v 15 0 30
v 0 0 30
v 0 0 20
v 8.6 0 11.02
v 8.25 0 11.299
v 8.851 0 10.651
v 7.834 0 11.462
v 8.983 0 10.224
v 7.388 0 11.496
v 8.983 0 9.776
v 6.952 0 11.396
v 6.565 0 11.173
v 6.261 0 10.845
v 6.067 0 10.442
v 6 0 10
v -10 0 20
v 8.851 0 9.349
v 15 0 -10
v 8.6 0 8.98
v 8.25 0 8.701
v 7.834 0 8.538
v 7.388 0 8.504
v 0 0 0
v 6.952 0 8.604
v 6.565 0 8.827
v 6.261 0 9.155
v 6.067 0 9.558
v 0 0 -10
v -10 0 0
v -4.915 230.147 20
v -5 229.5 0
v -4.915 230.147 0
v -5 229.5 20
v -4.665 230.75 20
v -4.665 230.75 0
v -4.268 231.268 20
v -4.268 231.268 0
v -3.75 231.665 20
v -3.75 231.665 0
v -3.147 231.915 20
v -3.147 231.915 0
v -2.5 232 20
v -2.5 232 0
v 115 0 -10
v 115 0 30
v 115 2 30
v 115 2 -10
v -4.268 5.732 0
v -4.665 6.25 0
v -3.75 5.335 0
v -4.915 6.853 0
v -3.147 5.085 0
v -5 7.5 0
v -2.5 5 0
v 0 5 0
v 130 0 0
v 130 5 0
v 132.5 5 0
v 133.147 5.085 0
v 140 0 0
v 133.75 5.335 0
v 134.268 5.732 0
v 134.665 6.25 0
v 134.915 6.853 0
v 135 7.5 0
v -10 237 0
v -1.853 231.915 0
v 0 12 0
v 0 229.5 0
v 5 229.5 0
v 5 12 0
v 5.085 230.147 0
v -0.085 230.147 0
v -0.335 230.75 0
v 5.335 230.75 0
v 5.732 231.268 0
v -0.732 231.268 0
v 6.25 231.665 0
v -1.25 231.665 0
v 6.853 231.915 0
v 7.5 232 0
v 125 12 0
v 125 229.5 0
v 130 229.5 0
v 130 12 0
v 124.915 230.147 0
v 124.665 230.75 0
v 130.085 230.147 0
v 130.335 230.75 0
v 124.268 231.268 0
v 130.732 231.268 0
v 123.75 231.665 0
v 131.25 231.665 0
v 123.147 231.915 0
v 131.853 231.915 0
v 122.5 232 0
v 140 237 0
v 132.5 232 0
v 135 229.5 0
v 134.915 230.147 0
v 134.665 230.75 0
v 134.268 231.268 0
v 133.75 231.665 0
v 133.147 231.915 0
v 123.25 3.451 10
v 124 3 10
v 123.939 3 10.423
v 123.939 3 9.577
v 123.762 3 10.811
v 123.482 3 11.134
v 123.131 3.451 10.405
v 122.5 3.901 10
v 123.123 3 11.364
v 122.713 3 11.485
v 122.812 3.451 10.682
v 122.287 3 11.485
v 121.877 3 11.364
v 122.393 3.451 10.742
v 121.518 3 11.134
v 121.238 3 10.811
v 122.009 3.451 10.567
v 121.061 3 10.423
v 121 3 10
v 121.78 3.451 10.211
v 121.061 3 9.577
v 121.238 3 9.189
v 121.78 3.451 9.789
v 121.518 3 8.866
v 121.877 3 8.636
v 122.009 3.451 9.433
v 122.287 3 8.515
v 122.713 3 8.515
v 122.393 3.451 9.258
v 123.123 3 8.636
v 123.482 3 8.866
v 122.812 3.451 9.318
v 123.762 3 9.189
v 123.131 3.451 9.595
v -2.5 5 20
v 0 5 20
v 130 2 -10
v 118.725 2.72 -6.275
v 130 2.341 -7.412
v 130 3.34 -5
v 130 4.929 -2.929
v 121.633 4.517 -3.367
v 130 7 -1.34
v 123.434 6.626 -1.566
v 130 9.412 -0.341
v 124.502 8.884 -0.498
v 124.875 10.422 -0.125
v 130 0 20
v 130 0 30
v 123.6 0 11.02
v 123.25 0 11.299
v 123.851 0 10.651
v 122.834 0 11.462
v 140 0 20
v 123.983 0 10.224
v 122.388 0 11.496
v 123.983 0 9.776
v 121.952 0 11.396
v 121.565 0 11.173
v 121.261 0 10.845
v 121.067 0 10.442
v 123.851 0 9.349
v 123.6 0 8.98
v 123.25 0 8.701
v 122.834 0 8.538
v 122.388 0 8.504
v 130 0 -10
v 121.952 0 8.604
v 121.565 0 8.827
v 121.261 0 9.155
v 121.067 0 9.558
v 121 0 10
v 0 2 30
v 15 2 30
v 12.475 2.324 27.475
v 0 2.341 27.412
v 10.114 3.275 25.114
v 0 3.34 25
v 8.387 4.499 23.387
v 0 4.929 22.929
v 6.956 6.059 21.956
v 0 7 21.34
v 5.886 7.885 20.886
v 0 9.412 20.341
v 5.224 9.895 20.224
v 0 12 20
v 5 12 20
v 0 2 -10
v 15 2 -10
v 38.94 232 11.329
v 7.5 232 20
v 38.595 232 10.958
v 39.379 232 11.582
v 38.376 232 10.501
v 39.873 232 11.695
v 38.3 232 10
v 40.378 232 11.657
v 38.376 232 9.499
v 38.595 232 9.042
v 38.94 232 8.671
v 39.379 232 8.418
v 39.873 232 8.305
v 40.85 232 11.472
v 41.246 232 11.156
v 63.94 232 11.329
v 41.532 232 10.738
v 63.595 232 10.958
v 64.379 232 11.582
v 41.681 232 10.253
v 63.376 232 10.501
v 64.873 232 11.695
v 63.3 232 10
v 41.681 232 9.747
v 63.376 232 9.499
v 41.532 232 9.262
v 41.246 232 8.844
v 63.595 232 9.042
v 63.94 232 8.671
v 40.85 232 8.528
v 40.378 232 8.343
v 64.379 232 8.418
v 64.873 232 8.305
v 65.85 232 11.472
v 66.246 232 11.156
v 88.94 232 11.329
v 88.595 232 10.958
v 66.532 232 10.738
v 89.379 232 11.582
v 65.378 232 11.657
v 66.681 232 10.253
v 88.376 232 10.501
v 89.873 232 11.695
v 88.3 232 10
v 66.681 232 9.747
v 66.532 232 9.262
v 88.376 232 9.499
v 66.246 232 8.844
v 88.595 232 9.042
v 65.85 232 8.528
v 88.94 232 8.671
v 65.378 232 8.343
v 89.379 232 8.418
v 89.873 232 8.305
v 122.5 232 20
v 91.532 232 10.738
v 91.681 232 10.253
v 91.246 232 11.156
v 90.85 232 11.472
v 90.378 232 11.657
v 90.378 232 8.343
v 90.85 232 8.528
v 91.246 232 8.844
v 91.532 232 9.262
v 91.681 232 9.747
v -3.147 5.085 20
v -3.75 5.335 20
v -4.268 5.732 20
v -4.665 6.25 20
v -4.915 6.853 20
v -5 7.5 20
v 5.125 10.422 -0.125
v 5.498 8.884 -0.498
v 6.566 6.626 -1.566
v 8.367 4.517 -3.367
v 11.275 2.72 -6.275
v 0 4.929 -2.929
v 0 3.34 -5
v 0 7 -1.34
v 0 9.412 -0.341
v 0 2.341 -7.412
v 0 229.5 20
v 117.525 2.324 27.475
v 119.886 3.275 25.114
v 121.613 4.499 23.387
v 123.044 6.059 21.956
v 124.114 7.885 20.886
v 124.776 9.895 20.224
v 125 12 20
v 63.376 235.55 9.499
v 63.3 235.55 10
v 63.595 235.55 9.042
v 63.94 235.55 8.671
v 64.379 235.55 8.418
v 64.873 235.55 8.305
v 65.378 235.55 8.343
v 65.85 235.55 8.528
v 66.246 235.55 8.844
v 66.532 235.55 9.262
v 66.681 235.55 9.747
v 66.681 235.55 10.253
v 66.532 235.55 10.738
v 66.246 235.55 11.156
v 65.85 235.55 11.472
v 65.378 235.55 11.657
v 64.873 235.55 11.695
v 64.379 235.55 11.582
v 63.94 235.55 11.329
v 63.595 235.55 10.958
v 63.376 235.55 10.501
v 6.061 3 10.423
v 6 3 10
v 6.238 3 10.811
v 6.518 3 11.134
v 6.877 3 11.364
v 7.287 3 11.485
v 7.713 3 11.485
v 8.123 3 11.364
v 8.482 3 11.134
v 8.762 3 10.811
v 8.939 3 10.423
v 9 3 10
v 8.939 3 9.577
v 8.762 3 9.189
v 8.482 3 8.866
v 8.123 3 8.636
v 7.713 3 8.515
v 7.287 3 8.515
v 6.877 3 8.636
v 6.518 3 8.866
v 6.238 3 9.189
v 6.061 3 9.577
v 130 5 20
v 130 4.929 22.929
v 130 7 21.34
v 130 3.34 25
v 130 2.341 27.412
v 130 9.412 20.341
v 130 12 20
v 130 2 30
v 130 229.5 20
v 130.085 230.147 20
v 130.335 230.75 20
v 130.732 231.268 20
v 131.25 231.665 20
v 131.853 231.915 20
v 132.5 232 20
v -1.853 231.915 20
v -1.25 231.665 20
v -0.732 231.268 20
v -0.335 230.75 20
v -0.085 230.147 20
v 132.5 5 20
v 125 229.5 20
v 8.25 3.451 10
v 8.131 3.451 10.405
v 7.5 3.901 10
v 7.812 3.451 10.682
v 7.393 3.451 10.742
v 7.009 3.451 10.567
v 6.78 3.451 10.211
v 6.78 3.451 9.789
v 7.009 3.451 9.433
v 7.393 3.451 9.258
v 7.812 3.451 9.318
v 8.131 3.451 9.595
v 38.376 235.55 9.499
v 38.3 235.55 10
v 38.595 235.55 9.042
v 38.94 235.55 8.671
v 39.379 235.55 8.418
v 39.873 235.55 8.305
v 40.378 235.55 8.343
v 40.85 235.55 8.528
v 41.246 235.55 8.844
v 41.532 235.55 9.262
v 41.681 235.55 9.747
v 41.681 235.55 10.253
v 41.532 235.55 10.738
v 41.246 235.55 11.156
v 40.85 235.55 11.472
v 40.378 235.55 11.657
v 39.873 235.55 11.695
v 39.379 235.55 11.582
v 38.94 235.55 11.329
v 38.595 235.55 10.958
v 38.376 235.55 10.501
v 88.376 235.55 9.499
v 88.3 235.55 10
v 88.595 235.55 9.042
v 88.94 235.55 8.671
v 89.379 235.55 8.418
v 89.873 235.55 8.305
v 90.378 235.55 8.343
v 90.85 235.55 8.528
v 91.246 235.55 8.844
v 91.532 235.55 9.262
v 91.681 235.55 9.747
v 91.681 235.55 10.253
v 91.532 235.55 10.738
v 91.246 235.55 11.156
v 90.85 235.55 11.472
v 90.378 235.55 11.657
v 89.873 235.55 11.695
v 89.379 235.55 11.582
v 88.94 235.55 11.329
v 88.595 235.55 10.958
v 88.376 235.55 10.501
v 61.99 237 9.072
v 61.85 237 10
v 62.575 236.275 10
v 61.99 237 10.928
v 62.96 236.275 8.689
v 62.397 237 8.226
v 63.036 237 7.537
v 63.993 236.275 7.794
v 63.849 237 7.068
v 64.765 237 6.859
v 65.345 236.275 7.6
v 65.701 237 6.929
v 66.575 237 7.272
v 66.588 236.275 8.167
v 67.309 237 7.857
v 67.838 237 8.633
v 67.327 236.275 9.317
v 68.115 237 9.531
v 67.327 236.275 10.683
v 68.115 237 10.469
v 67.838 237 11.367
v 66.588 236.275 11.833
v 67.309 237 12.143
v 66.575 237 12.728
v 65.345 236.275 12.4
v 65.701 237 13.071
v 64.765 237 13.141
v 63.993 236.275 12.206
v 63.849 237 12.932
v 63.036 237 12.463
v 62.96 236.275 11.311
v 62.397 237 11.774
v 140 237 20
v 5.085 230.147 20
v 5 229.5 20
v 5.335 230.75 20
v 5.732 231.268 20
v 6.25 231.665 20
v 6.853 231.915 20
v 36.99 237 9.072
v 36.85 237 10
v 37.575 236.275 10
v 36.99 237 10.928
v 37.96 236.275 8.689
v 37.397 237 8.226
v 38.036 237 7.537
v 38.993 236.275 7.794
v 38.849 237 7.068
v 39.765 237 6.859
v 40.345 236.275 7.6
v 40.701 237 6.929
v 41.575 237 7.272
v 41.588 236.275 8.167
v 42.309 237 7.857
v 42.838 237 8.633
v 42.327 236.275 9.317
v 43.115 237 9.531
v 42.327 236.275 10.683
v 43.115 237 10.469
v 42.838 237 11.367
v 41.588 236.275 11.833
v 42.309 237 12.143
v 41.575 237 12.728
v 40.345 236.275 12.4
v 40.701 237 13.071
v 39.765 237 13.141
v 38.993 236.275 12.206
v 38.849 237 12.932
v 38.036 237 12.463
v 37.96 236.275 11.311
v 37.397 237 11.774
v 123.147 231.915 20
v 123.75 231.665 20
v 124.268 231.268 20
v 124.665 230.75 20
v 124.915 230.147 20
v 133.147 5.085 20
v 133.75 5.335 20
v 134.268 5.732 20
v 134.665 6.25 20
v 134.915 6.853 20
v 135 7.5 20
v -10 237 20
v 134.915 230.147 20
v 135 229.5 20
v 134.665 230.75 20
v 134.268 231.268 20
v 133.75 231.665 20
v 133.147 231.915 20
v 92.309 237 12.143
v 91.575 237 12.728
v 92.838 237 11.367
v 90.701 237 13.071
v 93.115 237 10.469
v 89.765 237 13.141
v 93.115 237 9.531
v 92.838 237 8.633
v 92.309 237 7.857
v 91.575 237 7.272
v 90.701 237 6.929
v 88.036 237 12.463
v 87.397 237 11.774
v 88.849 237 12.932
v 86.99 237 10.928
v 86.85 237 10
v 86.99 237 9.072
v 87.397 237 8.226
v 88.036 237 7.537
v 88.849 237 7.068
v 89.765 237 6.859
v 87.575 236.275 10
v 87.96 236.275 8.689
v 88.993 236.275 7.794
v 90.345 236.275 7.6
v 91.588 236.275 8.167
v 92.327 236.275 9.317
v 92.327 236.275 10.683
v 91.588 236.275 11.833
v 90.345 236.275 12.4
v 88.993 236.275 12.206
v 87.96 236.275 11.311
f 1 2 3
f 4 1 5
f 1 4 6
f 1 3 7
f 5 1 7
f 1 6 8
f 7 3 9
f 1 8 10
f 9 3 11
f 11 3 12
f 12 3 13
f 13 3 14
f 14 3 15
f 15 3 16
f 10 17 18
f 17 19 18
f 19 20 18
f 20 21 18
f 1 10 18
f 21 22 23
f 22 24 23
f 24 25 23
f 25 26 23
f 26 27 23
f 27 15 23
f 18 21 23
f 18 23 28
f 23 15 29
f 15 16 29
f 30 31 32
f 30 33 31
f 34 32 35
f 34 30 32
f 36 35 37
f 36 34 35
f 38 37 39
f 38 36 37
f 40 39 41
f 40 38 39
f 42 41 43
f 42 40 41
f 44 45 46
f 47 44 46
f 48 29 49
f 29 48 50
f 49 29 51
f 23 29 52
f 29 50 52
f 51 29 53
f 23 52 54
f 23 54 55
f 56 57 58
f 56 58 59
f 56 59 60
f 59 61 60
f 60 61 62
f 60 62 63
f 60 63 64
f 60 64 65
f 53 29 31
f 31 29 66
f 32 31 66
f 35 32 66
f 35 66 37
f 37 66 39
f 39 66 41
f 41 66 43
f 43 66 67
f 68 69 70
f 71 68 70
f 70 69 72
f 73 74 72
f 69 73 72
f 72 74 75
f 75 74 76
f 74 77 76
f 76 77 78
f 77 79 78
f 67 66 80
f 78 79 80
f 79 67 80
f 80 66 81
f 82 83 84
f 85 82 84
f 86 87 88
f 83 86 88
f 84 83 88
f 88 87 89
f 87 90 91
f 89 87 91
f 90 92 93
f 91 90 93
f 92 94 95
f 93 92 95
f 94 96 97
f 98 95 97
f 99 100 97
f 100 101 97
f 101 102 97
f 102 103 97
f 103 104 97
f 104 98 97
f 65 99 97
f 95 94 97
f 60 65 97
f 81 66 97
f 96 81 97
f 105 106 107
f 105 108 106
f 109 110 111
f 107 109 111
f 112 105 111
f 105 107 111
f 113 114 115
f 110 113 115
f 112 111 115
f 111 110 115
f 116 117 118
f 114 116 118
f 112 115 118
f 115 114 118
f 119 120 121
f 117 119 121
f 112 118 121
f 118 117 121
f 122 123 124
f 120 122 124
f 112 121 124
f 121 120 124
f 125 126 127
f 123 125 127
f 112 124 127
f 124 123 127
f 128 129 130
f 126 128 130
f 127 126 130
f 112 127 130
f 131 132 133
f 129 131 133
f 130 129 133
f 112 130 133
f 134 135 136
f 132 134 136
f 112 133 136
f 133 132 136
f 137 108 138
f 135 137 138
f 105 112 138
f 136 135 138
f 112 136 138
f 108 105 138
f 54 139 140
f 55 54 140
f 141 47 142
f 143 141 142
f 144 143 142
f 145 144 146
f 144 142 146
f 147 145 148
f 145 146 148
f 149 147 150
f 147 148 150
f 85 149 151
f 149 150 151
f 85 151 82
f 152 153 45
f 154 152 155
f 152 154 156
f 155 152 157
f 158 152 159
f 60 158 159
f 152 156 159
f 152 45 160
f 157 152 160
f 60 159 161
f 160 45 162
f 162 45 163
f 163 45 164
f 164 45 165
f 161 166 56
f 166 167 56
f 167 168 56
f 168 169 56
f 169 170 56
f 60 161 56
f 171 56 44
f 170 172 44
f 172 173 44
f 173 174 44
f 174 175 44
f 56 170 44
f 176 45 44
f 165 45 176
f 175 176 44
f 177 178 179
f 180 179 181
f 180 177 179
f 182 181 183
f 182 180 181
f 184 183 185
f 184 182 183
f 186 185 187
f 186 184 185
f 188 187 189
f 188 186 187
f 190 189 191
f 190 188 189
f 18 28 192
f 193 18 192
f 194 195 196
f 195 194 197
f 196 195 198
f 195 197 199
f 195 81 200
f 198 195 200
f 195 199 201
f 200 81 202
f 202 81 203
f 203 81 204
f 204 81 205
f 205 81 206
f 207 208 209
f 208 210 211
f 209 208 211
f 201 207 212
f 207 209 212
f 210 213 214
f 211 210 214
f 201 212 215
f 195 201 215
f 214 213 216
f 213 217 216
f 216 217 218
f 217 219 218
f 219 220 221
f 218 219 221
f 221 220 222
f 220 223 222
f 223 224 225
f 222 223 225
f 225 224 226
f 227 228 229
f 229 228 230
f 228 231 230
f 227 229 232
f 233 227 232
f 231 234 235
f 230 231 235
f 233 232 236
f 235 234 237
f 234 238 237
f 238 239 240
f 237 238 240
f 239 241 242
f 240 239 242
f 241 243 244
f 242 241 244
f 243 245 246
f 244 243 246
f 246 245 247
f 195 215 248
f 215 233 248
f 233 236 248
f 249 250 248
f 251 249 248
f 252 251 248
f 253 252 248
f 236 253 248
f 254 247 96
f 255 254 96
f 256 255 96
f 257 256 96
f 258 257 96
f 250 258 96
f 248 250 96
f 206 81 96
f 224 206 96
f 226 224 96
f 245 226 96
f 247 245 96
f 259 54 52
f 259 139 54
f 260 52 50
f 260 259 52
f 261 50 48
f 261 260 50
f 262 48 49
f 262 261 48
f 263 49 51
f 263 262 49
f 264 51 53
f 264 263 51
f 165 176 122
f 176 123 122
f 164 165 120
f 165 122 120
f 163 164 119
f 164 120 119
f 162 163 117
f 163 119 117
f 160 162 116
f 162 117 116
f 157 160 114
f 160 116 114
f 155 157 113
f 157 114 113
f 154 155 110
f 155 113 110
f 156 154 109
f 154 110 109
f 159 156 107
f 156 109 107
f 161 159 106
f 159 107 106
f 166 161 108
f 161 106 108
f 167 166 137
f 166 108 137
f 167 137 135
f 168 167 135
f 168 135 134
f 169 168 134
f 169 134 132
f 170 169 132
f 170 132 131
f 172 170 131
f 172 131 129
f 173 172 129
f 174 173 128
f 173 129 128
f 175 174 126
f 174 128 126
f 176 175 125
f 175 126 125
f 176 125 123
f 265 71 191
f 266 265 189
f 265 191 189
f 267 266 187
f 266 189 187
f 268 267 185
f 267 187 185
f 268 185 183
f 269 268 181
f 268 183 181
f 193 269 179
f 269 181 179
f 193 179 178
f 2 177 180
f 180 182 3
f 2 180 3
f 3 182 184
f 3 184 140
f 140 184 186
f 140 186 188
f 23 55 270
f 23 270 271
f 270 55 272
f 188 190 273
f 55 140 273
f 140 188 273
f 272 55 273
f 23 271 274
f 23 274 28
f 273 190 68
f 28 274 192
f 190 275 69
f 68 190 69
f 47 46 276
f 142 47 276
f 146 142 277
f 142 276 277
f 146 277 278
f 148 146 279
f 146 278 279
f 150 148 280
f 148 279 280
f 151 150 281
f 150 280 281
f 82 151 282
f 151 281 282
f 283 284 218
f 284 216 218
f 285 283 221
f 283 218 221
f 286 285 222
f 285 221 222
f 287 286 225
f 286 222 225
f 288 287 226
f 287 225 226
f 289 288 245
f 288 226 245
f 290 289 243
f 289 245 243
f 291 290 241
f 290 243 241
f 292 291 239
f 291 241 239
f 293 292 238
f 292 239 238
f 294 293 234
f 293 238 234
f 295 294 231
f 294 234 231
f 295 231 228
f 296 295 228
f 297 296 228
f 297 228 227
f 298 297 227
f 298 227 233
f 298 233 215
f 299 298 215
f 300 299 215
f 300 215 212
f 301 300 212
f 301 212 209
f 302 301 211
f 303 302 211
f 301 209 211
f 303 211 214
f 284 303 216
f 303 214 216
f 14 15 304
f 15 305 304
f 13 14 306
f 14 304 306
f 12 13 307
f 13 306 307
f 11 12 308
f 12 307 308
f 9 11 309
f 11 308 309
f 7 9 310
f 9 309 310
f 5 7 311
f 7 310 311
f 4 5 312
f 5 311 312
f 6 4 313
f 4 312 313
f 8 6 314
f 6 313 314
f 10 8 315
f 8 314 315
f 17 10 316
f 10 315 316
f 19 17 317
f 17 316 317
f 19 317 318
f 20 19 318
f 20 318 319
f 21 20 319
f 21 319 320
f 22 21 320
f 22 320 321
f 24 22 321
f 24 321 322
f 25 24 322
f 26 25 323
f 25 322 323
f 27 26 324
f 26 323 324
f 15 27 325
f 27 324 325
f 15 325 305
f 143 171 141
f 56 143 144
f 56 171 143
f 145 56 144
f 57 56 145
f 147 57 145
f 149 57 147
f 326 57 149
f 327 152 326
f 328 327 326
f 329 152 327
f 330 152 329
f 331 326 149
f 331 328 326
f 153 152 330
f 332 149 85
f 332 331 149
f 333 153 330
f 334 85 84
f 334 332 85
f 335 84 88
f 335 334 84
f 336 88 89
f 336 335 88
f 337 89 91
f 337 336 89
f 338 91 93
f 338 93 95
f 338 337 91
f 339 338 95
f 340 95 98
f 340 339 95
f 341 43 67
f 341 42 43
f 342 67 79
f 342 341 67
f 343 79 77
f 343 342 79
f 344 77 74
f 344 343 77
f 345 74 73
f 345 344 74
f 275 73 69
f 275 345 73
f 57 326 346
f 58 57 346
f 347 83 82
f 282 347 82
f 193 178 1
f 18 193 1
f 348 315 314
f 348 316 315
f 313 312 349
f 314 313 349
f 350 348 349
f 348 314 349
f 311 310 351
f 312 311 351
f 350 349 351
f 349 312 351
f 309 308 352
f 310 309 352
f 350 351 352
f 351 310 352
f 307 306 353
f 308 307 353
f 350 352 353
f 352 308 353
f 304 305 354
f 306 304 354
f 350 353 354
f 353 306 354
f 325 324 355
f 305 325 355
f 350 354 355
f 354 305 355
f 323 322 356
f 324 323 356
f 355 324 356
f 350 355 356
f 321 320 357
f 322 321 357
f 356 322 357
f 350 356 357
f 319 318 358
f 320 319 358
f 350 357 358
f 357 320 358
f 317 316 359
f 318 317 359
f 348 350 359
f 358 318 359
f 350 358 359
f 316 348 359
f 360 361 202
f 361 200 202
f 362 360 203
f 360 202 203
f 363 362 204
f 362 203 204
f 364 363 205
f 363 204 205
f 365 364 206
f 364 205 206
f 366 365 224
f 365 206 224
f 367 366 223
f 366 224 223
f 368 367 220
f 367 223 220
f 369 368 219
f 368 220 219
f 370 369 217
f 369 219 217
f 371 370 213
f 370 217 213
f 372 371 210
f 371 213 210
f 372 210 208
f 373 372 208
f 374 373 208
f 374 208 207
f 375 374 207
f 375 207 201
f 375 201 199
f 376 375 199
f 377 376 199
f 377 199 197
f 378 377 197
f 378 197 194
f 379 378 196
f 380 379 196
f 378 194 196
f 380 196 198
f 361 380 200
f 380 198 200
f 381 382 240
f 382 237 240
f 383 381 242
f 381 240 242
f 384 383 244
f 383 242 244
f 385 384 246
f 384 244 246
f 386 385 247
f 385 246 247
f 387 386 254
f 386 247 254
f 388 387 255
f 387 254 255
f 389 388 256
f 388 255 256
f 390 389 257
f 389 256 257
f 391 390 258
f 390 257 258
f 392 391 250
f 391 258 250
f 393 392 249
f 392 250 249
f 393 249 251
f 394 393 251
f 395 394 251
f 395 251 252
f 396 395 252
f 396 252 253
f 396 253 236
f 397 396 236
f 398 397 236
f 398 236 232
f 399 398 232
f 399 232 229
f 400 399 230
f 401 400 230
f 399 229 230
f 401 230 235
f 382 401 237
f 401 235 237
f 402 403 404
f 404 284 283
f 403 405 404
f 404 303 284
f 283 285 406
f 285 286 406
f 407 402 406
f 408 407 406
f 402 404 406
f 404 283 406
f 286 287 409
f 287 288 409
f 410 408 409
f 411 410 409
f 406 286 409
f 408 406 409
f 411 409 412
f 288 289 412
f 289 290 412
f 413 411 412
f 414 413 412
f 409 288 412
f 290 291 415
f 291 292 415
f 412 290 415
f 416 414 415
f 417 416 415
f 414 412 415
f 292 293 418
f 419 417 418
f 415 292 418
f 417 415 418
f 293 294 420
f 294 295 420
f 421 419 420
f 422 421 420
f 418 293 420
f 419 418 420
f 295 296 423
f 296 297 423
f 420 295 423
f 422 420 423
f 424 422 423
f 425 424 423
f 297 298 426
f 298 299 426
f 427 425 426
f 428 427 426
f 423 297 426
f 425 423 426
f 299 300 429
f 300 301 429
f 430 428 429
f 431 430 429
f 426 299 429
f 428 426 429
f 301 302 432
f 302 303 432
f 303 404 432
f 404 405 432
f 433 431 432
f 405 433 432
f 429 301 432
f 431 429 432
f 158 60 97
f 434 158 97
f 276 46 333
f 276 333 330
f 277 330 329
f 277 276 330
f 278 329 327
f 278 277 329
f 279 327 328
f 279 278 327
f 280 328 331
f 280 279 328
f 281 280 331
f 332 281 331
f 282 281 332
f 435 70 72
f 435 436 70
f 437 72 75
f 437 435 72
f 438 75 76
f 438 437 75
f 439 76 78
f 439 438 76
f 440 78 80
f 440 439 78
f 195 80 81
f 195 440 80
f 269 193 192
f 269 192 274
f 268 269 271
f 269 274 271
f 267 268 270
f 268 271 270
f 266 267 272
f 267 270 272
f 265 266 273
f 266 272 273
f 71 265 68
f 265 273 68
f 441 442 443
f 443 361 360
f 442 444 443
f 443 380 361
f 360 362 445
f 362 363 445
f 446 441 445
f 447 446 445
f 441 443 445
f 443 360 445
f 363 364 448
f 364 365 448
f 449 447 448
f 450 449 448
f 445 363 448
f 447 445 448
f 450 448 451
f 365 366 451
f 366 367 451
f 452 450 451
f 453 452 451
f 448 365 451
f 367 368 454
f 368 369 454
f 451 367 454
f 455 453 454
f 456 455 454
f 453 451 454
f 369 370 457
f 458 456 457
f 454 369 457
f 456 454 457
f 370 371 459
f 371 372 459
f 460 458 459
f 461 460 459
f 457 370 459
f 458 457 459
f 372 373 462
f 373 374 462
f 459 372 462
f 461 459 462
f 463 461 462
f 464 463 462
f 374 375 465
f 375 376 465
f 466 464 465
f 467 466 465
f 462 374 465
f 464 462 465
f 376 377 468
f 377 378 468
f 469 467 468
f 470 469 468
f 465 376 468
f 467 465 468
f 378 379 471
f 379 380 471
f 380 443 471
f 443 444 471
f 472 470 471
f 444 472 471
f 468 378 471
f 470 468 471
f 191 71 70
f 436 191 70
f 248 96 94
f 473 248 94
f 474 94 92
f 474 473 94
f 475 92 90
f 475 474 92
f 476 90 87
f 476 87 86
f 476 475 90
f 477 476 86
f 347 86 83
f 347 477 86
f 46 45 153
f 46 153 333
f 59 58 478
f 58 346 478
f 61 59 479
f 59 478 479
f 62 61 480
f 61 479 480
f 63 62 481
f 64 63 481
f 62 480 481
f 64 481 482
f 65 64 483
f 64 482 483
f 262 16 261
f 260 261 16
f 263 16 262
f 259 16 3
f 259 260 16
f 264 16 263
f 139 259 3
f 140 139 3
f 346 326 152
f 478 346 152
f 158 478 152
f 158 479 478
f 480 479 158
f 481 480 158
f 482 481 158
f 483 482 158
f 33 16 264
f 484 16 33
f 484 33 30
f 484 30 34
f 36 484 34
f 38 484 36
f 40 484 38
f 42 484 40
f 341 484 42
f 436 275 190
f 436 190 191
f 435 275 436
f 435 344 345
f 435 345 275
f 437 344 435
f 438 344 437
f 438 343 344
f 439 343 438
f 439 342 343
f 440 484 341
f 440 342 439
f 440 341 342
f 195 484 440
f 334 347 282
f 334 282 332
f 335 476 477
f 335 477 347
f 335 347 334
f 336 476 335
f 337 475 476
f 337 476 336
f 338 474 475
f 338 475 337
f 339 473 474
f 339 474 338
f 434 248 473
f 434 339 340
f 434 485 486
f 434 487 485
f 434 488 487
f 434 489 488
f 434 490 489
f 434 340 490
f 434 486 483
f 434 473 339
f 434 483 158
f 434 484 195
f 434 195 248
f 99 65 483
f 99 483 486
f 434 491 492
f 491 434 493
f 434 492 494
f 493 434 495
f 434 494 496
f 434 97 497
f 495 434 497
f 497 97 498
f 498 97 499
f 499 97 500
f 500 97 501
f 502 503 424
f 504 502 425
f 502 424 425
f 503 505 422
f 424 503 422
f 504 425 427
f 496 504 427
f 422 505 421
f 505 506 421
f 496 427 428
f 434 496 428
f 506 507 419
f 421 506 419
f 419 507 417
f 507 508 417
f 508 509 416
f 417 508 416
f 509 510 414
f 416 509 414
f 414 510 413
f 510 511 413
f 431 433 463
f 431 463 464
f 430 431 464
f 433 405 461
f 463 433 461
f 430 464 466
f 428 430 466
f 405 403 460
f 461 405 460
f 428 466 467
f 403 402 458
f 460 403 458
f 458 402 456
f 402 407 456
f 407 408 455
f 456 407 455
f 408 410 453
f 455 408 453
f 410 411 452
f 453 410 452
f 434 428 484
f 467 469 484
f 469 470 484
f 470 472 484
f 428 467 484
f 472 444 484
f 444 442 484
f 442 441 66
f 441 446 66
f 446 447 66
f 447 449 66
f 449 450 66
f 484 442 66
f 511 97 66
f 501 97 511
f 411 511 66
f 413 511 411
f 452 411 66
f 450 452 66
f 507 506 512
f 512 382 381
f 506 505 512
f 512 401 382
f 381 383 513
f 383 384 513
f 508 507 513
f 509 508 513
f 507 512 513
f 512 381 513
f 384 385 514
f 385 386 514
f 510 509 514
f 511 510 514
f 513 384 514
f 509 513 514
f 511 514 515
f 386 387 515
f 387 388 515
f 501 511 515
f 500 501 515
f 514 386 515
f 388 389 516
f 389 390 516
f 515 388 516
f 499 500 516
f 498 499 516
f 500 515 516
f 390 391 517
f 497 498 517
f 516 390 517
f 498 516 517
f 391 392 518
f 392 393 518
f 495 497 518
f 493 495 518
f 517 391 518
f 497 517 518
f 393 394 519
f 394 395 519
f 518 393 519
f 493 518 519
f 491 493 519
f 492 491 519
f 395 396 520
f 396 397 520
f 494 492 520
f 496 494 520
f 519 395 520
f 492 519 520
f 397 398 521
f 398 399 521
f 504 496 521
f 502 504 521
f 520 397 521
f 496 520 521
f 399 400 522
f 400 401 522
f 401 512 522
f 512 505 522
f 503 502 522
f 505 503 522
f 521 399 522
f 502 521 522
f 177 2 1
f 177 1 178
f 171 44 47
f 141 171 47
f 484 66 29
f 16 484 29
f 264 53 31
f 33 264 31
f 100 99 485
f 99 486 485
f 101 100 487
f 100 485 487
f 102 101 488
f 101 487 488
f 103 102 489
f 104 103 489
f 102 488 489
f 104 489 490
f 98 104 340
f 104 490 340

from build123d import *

# Parameters (mm, degrees)
SKETCH2_W                                       = 5
SKETCH2_H                                       = 227
BOSS_EXTRUDE1_DEPTH                             = 20
BOSS_EXTRUDE2_REACH                             = 277.987
CUT_EXTRUDE1_DEPTH                              = 44
F_3_0MM_DOWEL_HOLE1_D                           = 3
F_3_0MM_DOWEL_HOLE1_DEPTH                       = 3
F_3_0MM_DOWEL_HOLE1_TIP                         = 0.901290929
CSK_FOR_M3_FLAT_HEAD_MACHINE_SCREW1_D           = 3.4
CSK_FOR_M3_FLAT_HEAD_MACHINE_SCREW1_CSINK_D     = 6.3
CSK_FOR_M3_FLAT_HEAD_MACHINE_SCREW1_CSINK_ANGLE = 90
FILLET1_R                                       = 2.5


with BuildPart() as part:
    # Sketch2 → Boss-Extrude1 (new body)
    with BuildSketch(Plane.XY):
        Polygon((15, 12), (5, 12), (5, 232), (125, 232), (125, 12), (115, 12), (115, 0), (140, 0), (140, 237), (-10, 237), (-10, 0), (15, 0), align=None)
        with Locations((132.5, 118.5)):
            Rectangle(SKETCH2_W, SKETCH2_H, mode=Mode.SUBTRACT)
        with Locations((-2.5, 118.5)):
            Rectangle(SKETCH2_W, SKETCH2_H, mode=Mode.SUBTRACT)
    extrude(amount=BOSS_EXTRUDE1_DEPTH)

    # Boss-Extrude2: up to this face of the body (flat: up to its plane)
    boss_extrude2_end = Plane(part.part.faces().sort_by_distance((130, 118.5, 10))[0])
    # Sketch3 → Boss-Extrude2 (add, up to the picked face)
    with BuildSketch(Plane.ZY, mode=Mode.PRIVATE) as boss_extrude2_sk1:
        with BuildLine():
            Line((20, 0), (30, 0))
            Line((30, 0), (30, 2))
            ThreePointArc((30, 2), (22.928932188, 4.928932188), (20, 12))
            Line((20, 12), (20, 0))
        make_face()
    boss_extrude2_tool1 = split(extrude(boss_extrude2_sk1.sketch, amount=-BOSS_EXTRUDE2_REACH, mode=Mode.PRIVATE), bisect_by=boss_extrude2_end, keep=Keep.BOTH, mode=Mode.PRIVATE)
    # Sketch3 → Boss-Extrude2 (add, up to the picked face)
    with BuildSketch(Plane.ZY, mode=Mode.PRIVATE) as boss_extrude2_sk2:
        with BuildLine():
            Line((0, 0), (-10, 0))
            Line((-10, 0), (-10, 2))
            ThreePointArc((-10, 2), (-2.928932188, 4.928932188), (0, 12))
            Line((0, 12), (0, 0))
        make_face()
    boss_extrude2_tool2 = split(extrude(boss_extrude2_sk2.sketch, amount=-BOSS_EXTRUDE2_REACH, mode=Mode.PRIVATE), bisect_by=boss_extrude2_end, keep=Keep.BOTH, mode=Mode.PRIVATE)
    add(boss_extrude2_tool1.solids().sort_by(Axis((0, 2.673783, 23.568126), (1, 0, 0)))[0])
    add(boss_extrude2_tool2.solids().sort_by(Axis((0, 2.673783, -3.568126), (1, 0, 0)))[0])

    # Sketch4 → Cut-Extrude1 (cut)
    with BuildSketch(Plane.XY.offset(30)):
        with BuildLine():
            Line((15, 2), (15, 0))
            Line((15, 0), (115, 0))
            Line((115, 0), (115, 2))
            ThreePointArc((115, 2), (122.071067812, 4.928932188), (125, 12))
            Line((125, 12), (5, 12))
            ThreePointArc((5, 12), (7.928932188, 4.928932188), (15, 2))
        make_face()
    extrude(amount=-CUT_EXTRUDE1_DEPTH, mode=Mode.SUBTRACT)

    # Ø3.0mm Dowel Hole1
    with Locations(Plane.XZ):
        with Locations((7.5, 10), (122.5, 10)):
            Hole(F_3_0MM_DOWEL_HOLE1_D / 2, depth=F_3_0MM_DOWEL_HOLE1_DEPTH)
            with Locations((0, 0, -(F_3_0MM_DOWEL_HOLE1_DEPTH + F_3_0MM_DOWEL_HOLE1_TIP / 2))):  # 118° drill point
                Cone(0, F_3_0MM_DOWEL_HOLE1_D / 2, F_3_0MM_DOWEL_HOLE1_TIP, mode=Mode.SUBTRACT)

    # CSK for M3 Flat Head Machine Screw1 (through all)
    with Locations(Plane(origin=(0, 237, 0), x_dir=(1, 0, 0), z_dir=(0, 1, 0))):
        with Locations((40, -10), (90, -10), (65, -10)):
            CounterSinkHole(CSK_FOR_M3_FLAT_HEAD_MACHINE_SCREW1_D / 2, CSK_FOR_M3_FLAT_HEAD_MACHINE_SCREW1_CSINK_D / 2, counter_sink_angle=CSK_FOR_M3_FLAT_HEAD_MACHINE_SCREW1_CSINK_ANGLE)

    # Fillet1
    fillet1_edges = [part.edges().sort_by_distance(p)[0] for p in [
        (0, 232, 10),
        (-5, 232, 10),
        (-5, 5, 10),
        (130, 232, 10),
        (135, 232, 10),
        (135, 5, 10),
        (5, 232, 10),
        (125, 232, 10),
    ]]
    fillet(fillet1_edges, radius=FILLET1_R - 0.0001)  # a hair under: the kernel refuses the full size


solid = part.part
